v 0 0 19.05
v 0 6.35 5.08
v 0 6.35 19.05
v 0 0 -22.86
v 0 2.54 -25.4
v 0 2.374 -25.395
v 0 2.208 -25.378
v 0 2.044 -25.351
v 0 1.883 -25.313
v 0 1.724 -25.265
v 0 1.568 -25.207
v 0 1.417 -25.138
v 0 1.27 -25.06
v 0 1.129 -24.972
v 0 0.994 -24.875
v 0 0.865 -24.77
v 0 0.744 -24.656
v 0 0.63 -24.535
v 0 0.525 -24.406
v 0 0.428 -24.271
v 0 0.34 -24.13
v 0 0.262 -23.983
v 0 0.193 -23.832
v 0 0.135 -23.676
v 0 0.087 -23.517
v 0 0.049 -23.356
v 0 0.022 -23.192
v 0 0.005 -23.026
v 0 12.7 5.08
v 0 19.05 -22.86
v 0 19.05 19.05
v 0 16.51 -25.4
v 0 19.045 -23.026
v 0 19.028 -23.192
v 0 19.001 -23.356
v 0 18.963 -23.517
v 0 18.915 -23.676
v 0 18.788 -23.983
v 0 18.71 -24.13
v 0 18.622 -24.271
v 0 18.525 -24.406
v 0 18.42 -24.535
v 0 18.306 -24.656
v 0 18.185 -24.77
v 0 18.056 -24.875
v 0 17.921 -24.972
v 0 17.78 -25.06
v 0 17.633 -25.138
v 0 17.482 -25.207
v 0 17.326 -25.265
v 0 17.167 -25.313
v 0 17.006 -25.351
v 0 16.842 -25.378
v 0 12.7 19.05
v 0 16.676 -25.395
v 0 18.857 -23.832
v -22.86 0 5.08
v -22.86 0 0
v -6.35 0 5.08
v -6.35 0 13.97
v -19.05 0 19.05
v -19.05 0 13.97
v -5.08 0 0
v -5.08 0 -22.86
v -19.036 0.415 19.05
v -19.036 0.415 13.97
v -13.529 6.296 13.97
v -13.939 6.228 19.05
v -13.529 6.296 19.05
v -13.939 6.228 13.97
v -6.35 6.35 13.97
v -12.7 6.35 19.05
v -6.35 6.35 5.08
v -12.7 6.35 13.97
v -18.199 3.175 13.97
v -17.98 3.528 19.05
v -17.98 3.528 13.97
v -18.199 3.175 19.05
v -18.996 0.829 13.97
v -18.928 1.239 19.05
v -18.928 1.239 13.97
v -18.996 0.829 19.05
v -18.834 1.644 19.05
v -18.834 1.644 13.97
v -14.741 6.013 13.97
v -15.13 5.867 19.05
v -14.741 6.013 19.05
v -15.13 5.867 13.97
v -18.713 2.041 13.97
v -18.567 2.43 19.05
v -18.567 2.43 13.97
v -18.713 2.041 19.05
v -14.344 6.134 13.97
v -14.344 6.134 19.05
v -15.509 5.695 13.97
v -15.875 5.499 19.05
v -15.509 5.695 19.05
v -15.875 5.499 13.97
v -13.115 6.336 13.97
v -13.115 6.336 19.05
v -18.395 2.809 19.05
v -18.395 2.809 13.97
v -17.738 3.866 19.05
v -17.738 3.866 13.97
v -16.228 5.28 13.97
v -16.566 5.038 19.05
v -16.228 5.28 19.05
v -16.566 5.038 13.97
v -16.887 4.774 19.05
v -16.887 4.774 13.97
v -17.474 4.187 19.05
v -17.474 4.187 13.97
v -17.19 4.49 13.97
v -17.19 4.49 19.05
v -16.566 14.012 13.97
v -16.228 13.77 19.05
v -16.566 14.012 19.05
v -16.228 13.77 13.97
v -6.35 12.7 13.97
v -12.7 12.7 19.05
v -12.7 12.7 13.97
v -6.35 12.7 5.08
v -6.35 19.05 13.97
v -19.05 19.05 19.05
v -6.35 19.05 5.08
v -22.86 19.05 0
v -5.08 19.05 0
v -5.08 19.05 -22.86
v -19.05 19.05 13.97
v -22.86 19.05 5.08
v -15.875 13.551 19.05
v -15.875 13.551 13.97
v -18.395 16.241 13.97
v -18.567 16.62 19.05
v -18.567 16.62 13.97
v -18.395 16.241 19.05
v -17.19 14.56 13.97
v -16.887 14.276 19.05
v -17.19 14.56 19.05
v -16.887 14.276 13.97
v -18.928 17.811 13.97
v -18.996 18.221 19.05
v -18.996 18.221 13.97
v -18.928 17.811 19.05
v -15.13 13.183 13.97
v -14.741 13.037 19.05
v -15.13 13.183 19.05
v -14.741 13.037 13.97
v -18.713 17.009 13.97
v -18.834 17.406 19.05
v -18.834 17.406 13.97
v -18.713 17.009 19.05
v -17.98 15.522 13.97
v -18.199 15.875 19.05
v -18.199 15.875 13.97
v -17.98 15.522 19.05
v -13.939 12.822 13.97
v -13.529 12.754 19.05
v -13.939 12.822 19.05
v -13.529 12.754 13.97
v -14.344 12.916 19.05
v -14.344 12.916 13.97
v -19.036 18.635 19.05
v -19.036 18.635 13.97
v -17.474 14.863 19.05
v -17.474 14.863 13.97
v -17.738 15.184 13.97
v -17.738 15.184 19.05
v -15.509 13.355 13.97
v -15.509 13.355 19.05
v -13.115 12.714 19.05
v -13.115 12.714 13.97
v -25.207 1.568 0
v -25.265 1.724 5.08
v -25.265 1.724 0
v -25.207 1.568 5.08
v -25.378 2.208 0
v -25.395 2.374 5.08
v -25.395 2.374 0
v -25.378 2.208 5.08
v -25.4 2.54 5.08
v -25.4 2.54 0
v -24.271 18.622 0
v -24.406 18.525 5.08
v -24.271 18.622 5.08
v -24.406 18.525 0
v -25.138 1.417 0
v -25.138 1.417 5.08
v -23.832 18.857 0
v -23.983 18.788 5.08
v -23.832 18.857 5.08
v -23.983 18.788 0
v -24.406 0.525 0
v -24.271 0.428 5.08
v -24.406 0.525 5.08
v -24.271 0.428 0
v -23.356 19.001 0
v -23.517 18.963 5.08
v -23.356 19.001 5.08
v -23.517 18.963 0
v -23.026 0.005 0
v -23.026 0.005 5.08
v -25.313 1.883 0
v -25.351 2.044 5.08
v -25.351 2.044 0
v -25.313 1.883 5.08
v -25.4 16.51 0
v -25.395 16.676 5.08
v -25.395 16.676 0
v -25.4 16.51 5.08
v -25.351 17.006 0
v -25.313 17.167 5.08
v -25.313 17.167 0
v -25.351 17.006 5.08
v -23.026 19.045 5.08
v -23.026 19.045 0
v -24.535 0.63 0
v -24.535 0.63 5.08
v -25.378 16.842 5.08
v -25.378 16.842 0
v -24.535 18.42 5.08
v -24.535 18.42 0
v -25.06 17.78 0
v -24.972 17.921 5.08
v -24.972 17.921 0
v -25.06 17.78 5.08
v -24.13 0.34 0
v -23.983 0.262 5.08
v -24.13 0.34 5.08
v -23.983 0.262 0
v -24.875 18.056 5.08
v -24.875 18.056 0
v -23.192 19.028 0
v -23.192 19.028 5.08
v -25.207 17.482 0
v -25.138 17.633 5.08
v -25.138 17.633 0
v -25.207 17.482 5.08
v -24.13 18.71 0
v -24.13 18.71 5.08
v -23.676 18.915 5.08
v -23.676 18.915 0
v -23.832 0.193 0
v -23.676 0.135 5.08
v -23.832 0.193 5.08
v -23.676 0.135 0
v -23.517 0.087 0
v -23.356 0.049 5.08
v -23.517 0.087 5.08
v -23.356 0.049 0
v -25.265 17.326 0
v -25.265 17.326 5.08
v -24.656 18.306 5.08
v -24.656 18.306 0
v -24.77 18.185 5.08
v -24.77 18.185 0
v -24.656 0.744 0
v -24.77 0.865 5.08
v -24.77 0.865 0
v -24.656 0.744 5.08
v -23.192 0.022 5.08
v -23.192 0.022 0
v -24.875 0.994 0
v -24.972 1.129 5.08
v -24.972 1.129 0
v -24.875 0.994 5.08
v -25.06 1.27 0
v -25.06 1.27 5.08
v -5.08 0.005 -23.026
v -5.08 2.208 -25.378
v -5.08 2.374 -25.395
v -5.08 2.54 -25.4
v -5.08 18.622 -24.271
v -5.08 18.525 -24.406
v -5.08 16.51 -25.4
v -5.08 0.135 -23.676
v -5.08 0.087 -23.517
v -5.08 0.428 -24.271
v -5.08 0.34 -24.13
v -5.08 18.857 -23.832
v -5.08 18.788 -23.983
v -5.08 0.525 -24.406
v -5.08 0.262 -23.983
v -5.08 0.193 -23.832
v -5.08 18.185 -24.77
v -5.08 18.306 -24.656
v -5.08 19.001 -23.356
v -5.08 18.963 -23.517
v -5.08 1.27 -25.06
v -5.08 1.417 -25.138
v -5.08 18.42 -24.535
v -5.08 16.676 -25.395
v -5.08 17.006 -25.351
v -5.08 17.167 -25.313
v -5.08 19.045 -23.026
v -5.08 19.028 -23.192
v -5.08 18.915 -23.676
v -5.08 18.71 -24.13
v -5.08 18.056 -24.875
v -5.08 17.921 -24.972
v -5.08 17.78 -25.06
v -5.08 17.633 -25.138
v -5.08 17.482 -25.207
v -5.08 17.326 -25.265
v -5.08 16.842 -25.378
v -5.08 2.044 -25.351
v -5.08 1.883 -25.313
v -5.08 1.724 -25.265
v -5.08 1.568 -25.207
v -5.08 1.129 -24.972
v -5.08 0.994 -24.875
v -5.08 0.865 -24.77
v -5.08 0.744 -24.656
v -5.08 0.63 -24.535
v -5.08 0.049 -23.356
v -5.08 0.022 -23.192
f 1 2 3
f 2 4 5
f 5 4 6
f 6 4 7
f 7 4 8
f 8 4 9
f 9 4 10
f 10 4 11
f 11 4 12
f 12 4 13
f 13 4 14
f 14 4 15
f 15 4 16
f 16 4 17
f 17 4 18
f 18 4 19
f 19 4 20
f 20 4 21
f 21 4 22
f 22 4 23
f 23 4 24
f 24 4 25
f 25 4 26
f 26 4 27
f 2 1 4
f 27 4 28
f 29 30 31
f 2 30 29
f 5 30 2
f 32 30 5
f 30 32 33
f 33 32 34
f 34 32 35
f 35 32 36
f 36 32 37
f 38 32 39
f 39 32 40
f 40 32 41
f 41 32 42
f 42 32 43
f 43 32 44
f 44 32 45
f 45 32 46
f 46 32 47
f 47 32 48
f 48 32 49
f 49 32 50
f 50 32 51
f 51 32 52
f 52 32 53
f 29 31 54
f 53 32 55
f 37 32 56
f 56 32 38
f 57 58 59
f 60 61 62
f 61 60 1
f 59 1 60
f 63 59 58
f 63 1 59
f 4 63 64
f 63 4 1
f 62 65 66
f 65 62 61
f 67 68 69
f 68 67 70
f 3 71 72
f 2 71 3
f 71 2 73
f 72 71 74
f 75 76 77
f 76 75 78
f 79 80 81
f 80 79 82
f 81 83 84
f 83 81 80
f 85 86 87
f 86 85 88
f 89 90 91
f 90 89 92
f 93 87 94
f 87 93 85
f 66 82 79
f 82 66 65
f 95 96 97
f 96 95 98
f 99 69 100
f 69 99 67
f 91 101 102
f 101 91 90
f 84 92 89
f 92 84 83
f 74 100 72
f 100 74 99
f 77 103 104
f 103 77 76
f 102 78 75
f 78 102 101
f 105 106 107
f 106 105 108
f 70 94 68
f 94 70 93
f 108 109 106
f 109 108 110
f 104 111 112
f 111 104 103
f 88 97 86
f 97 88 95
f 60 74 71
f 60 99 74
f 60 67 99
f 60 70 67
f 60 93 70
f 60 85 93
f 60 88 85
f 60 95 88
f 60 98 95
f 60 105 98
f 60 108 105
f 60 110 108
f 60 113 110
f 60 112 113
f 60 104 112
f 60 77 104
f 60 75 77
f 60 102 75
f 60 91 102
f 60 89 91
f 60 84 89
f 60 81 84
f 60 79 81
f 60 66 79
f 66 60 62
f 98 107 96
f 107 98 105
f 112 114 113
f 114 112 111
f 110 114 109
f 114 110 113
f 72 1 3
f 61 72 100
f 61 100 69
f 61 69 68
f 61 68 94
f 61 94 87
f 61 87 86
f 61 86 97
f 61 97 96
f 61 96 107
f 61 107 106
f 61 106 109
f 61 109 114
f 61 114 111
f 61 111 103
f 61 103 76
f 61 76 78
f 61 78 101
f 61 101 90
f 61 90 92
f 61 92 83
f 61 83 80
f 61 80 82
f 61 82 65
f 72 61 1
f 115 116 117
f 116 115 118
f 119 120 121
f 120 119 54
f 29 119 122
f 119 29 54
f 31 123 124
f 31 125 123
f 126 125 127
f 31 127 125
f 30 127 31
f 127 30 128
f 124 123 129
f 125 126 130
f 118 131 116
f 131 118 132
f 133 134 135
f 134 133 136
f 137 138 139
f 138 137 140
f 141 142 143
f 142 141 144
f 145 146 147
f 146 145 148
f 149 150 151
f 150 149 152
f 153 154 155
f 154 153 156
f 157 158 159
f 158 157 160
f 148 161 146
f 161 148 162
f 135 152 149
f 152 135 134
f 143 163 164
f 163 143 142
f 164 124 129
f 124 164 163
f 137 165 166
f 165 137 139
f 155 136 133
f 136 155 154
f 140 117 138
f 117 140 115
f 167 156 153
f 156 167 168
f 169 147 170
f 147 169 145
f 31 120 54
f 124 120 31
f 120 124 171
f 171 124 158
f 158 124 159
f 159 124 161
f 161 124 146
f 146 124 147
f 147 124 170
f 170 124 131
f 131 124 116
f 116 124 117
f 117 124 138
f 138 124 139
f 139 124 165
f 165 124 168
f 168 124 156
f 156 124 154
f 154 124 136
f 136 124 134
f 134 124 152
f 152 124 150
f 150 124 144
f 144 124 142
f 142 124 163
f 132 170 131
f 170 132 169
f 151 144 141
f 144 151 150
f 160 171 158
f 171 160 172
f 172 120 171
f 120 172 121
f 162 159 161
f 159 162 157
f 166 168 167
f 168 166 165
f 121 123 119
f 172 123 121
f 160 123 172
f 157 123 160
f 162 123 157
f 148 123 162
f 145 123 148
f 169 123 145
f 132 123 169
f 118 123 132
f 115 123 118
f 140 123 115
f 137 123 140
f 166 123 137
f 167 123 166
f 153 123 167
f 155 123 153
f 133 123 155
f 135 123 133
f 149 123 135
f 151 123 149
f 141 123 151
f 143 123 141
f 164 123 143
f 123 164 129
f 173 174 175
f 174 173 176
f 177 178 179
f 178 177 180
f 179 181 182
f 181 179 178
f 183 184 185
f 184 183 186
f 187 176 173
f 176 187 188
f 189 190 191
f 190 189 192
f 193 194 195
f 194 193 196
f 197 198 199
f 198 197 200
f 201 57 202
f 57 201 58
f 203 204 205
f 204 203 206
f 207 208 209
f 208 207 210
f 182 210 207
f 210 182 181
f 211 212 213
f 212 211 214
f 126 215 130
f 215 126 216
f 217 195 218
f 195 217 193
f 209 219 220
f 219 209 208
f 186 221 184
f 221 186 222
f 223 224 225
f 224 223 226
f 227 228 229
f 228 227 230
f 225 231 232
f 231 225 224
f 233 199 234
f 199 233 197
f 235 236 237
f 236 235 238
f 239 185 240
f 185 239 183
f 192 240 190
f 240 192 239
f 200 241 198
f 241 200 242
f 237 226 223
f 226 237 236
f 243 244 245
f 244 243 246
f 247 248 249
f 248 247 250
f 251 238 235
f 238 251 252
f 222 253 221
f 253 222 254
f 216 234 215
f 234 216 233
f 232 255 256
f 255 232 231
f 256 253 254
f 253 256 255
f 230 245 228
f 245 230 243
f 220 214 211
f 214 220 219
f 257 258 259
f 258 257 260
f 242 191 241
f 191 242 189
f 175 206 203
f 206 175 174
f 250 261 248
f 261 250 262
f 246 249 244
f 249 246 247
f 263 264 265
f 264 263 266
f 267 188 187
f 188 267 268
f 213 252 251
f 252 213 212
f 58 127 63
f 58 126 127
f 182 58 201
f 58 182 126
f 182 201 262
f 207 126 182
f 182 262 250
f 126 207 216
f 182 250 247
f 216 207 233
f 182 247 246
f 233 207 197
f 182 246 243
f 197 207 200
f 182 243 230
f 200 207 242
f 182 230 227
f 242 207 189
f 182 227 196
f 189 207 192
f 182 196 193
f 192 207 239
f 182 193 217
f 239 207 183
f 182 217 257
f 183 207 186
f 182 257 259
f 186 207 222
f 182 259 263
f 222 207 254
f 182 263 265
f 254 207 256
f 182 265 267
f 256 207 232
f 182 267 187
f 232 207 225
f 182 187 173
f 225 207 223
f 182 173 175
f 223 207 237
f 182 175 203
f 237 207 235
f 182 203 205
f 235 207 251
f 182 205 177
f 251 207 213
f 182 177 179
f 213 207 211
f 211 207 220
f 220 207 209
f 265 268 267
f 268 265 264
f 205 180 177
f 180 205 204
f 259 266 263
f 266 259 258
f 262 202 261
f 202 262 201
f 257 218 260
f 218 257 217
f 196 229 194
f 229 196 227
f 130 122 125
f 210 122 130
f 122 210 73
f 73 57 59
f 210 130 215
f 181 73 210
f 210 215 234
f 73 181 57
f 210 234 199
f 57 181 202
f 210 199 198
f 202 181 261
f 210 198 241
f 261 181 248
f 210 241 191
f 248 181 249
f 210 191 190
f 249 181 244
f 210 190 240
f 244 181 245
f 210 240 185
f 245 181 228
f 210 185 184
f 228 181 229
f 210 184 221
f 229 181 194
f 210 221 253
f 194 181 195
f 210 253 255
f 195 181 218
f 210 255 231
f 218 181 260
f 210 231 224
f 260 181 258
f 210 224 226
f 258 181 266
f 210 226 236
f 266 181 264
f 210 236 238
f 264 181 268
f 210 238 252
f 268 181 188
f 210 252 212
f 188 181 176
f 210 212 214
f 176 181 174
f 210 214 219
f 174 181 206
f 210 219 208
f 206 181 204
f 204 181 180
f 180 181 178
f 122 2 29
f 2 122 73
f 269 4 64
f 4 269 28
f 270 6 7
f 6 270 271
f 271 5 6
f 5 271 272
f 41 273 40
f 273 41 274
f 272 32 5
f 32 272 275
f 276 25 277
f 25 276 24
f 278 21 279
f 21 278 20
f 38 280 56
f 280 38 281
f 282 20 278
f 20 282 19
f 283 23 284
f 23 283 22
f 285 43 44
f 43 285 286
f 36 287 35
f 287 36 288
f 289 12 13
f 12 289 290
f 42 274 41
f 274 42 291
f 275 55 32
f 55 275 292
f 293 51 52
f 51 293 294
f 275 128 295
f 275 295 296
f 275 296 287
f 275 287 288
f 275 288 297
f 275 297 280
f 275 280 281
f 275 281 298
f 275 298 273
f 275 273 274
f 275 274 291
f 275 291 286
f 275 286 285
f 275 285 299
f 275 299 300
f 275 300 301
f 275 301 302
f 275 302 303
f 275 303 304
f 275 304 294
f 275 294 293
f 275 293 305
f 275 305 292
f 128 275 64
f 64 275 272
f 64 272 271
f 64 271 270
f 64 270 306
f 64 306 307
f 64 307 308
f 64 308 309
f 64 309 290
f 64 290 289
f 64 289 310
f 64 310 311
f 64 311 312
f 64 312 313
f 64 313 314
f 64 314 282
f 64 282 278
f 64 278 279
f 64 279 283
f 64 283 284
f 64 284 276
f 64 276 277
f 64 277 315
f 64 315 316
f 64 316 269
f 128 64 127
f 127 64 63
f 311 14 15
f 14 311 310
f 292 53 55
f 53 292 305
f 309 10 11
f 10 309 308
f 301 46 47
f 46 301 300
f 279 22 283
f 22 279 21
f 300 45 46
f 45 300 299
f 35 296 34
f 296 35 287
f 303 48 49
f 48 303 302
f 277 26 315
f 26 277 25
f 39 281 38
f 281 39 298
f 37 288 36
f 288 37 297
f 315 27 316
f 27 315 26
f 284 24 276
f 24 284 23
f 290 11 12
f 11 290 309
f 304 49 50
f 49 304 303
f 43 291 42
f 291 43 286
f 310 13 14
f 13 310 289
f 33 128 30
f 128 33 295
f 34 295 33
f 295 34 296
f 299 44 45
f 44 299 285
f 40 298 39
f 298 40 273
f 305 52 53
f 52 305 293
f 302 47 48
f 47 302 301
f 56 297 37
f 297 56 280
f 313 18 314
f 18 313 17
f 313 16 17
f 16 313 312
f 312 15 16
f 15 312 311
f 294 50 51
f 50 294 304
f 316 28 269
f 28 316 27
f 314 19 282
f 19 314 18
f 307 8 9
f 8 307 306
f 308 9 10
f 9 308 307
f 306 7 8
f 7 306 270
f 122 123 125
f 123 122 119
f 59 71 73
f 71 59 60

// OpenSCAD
ViewScale = [0.0254, 0.0254, 0.0254];
cablegap = 250;

module upperarm ()
{
    linear_extrude(200){
    difference() {
    circle(250, $fn=96);
    translate([-300, -300, 0])
    square([600, 300]);
    }
    translate([0, 0, 0])
    square([500, 250]);
    }
}

module upperarms()
{
    upperarm();
    translate([0, cablegap+500, 0])
    mirror([0, 1, 0])
    upperarm();
}

module support()
{
    square([250, cablegap]);
}

module supports()
{
    linear_extrude(350) {
    support();
    translate([0, cablegap+250, 0])
    support();
    }
}


module halfrounded()
{
    linear_extrude(200)
    hull() {
    translate([100, 500+cablegap-100, 0])
    circle(100, $fn=96);
    translate([100, 100, 0])
    circle(100, $fn=96);
    translate([100, 0, 0])
    square([900, 500+cablegap]);
    }
}

module base()
{
    halfrounded();

    translate([1000, 0, -1000])
    rotate([0, -90, 0])
    halfrounded();
}

scale(ViewScale)
{
    translate([-500, 0, 550])
    upperarms();
    translate([-250, 0, 200])
    supports();
    translate([-1000, 0, 0])
    base();
}
